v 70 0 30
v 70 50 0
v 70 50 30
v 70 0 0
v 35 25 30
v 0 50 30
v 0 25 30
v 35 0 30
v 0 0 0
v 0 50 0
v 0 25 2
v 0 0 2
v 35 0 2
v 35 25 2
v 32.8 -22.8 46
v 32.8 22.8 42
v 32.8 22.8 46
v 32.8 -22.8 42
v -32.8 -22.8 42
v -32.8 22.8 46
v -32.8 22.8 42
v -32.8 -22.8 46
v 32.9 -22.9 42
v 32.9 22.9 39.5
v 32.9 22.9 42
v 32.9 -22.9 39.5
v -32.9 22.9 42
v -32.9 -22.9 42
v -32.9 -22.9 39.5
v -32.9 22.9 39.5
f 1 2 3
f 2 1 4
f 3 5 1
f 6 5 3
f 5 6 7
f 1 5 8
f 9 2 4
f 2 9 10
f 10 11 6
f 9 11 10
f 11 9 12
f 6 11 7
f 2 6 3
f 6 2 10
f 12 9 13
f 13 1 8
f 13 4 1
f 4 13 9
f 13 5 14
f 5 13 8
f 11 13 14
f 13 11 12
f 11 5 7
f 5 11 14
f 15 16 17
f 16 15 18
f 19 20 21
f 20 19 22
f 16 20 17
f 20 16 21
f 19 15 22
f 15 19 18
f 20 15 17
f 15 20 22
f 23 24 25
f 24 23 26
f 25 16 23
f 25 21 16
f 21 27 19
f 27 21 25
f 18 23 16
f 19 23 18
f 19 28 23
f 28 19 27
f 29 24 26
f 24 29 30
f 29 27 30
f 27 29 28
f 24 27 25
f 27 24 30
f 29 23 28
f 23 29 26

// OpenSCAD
// Two-part enclosure for small electronics board
// Print orientation: box standing on the bed, lid flat on top

// ---------------- Parameters ----------------
box_x      = 70;    // box outer length (X)
box_y      = 50;    // box outer width (Y)
box_z      = 30;    // box outer height (Z)
box_wall   = 2;     // box wall thickness
box_floor  = 2;     // box floor thickness

lip_x      = 65.6;  // lip outer length (X)
lip_y      = 45.6;  // lip outer width (Y)
lip_thk    = 1.5;   // lip wall thickness
lip_h      = 4;     // lip height from plate

plate_t    = 2;     // lid plate thickness
eps        = 0.5;   // cutter overshoot

gap        = 10;    // gap between box and lid

$fn = 64;

// ---------------- Model ----------------
union() {
    // Box
    difference() {
        cube([box_x, box_y, box_z]);
        translate([-box_x/2, -box_y/2, box_floor])
            cube([box_x, box_y, box_z - box_floor + eps]);
    }

    // Lid (shifted up by gap, so it prints above the box)
    translate([0, 0, box_z + gap]) {
        union() {
            // Base plate
            translate([-lip_x/2, -lip_y/2, 0])
                cube([lip_x, lip_y, plate_t]);

            // Lip
            translate([-lip_x/2, -lip_y/2, plate_t])
                cube([lip_x, lip_y, lip_h]);
        }

        // Cut the lip opening (outer size 65.6 x 45.6, so 0.2 mm clearance)
        translate([-lip_x/2 - 0.1, -lip_y/2 - 0.1, -eps])
            cube([lip_x + 0.2, lip_y + 0.2, plate_t + eps]);
    }
}
